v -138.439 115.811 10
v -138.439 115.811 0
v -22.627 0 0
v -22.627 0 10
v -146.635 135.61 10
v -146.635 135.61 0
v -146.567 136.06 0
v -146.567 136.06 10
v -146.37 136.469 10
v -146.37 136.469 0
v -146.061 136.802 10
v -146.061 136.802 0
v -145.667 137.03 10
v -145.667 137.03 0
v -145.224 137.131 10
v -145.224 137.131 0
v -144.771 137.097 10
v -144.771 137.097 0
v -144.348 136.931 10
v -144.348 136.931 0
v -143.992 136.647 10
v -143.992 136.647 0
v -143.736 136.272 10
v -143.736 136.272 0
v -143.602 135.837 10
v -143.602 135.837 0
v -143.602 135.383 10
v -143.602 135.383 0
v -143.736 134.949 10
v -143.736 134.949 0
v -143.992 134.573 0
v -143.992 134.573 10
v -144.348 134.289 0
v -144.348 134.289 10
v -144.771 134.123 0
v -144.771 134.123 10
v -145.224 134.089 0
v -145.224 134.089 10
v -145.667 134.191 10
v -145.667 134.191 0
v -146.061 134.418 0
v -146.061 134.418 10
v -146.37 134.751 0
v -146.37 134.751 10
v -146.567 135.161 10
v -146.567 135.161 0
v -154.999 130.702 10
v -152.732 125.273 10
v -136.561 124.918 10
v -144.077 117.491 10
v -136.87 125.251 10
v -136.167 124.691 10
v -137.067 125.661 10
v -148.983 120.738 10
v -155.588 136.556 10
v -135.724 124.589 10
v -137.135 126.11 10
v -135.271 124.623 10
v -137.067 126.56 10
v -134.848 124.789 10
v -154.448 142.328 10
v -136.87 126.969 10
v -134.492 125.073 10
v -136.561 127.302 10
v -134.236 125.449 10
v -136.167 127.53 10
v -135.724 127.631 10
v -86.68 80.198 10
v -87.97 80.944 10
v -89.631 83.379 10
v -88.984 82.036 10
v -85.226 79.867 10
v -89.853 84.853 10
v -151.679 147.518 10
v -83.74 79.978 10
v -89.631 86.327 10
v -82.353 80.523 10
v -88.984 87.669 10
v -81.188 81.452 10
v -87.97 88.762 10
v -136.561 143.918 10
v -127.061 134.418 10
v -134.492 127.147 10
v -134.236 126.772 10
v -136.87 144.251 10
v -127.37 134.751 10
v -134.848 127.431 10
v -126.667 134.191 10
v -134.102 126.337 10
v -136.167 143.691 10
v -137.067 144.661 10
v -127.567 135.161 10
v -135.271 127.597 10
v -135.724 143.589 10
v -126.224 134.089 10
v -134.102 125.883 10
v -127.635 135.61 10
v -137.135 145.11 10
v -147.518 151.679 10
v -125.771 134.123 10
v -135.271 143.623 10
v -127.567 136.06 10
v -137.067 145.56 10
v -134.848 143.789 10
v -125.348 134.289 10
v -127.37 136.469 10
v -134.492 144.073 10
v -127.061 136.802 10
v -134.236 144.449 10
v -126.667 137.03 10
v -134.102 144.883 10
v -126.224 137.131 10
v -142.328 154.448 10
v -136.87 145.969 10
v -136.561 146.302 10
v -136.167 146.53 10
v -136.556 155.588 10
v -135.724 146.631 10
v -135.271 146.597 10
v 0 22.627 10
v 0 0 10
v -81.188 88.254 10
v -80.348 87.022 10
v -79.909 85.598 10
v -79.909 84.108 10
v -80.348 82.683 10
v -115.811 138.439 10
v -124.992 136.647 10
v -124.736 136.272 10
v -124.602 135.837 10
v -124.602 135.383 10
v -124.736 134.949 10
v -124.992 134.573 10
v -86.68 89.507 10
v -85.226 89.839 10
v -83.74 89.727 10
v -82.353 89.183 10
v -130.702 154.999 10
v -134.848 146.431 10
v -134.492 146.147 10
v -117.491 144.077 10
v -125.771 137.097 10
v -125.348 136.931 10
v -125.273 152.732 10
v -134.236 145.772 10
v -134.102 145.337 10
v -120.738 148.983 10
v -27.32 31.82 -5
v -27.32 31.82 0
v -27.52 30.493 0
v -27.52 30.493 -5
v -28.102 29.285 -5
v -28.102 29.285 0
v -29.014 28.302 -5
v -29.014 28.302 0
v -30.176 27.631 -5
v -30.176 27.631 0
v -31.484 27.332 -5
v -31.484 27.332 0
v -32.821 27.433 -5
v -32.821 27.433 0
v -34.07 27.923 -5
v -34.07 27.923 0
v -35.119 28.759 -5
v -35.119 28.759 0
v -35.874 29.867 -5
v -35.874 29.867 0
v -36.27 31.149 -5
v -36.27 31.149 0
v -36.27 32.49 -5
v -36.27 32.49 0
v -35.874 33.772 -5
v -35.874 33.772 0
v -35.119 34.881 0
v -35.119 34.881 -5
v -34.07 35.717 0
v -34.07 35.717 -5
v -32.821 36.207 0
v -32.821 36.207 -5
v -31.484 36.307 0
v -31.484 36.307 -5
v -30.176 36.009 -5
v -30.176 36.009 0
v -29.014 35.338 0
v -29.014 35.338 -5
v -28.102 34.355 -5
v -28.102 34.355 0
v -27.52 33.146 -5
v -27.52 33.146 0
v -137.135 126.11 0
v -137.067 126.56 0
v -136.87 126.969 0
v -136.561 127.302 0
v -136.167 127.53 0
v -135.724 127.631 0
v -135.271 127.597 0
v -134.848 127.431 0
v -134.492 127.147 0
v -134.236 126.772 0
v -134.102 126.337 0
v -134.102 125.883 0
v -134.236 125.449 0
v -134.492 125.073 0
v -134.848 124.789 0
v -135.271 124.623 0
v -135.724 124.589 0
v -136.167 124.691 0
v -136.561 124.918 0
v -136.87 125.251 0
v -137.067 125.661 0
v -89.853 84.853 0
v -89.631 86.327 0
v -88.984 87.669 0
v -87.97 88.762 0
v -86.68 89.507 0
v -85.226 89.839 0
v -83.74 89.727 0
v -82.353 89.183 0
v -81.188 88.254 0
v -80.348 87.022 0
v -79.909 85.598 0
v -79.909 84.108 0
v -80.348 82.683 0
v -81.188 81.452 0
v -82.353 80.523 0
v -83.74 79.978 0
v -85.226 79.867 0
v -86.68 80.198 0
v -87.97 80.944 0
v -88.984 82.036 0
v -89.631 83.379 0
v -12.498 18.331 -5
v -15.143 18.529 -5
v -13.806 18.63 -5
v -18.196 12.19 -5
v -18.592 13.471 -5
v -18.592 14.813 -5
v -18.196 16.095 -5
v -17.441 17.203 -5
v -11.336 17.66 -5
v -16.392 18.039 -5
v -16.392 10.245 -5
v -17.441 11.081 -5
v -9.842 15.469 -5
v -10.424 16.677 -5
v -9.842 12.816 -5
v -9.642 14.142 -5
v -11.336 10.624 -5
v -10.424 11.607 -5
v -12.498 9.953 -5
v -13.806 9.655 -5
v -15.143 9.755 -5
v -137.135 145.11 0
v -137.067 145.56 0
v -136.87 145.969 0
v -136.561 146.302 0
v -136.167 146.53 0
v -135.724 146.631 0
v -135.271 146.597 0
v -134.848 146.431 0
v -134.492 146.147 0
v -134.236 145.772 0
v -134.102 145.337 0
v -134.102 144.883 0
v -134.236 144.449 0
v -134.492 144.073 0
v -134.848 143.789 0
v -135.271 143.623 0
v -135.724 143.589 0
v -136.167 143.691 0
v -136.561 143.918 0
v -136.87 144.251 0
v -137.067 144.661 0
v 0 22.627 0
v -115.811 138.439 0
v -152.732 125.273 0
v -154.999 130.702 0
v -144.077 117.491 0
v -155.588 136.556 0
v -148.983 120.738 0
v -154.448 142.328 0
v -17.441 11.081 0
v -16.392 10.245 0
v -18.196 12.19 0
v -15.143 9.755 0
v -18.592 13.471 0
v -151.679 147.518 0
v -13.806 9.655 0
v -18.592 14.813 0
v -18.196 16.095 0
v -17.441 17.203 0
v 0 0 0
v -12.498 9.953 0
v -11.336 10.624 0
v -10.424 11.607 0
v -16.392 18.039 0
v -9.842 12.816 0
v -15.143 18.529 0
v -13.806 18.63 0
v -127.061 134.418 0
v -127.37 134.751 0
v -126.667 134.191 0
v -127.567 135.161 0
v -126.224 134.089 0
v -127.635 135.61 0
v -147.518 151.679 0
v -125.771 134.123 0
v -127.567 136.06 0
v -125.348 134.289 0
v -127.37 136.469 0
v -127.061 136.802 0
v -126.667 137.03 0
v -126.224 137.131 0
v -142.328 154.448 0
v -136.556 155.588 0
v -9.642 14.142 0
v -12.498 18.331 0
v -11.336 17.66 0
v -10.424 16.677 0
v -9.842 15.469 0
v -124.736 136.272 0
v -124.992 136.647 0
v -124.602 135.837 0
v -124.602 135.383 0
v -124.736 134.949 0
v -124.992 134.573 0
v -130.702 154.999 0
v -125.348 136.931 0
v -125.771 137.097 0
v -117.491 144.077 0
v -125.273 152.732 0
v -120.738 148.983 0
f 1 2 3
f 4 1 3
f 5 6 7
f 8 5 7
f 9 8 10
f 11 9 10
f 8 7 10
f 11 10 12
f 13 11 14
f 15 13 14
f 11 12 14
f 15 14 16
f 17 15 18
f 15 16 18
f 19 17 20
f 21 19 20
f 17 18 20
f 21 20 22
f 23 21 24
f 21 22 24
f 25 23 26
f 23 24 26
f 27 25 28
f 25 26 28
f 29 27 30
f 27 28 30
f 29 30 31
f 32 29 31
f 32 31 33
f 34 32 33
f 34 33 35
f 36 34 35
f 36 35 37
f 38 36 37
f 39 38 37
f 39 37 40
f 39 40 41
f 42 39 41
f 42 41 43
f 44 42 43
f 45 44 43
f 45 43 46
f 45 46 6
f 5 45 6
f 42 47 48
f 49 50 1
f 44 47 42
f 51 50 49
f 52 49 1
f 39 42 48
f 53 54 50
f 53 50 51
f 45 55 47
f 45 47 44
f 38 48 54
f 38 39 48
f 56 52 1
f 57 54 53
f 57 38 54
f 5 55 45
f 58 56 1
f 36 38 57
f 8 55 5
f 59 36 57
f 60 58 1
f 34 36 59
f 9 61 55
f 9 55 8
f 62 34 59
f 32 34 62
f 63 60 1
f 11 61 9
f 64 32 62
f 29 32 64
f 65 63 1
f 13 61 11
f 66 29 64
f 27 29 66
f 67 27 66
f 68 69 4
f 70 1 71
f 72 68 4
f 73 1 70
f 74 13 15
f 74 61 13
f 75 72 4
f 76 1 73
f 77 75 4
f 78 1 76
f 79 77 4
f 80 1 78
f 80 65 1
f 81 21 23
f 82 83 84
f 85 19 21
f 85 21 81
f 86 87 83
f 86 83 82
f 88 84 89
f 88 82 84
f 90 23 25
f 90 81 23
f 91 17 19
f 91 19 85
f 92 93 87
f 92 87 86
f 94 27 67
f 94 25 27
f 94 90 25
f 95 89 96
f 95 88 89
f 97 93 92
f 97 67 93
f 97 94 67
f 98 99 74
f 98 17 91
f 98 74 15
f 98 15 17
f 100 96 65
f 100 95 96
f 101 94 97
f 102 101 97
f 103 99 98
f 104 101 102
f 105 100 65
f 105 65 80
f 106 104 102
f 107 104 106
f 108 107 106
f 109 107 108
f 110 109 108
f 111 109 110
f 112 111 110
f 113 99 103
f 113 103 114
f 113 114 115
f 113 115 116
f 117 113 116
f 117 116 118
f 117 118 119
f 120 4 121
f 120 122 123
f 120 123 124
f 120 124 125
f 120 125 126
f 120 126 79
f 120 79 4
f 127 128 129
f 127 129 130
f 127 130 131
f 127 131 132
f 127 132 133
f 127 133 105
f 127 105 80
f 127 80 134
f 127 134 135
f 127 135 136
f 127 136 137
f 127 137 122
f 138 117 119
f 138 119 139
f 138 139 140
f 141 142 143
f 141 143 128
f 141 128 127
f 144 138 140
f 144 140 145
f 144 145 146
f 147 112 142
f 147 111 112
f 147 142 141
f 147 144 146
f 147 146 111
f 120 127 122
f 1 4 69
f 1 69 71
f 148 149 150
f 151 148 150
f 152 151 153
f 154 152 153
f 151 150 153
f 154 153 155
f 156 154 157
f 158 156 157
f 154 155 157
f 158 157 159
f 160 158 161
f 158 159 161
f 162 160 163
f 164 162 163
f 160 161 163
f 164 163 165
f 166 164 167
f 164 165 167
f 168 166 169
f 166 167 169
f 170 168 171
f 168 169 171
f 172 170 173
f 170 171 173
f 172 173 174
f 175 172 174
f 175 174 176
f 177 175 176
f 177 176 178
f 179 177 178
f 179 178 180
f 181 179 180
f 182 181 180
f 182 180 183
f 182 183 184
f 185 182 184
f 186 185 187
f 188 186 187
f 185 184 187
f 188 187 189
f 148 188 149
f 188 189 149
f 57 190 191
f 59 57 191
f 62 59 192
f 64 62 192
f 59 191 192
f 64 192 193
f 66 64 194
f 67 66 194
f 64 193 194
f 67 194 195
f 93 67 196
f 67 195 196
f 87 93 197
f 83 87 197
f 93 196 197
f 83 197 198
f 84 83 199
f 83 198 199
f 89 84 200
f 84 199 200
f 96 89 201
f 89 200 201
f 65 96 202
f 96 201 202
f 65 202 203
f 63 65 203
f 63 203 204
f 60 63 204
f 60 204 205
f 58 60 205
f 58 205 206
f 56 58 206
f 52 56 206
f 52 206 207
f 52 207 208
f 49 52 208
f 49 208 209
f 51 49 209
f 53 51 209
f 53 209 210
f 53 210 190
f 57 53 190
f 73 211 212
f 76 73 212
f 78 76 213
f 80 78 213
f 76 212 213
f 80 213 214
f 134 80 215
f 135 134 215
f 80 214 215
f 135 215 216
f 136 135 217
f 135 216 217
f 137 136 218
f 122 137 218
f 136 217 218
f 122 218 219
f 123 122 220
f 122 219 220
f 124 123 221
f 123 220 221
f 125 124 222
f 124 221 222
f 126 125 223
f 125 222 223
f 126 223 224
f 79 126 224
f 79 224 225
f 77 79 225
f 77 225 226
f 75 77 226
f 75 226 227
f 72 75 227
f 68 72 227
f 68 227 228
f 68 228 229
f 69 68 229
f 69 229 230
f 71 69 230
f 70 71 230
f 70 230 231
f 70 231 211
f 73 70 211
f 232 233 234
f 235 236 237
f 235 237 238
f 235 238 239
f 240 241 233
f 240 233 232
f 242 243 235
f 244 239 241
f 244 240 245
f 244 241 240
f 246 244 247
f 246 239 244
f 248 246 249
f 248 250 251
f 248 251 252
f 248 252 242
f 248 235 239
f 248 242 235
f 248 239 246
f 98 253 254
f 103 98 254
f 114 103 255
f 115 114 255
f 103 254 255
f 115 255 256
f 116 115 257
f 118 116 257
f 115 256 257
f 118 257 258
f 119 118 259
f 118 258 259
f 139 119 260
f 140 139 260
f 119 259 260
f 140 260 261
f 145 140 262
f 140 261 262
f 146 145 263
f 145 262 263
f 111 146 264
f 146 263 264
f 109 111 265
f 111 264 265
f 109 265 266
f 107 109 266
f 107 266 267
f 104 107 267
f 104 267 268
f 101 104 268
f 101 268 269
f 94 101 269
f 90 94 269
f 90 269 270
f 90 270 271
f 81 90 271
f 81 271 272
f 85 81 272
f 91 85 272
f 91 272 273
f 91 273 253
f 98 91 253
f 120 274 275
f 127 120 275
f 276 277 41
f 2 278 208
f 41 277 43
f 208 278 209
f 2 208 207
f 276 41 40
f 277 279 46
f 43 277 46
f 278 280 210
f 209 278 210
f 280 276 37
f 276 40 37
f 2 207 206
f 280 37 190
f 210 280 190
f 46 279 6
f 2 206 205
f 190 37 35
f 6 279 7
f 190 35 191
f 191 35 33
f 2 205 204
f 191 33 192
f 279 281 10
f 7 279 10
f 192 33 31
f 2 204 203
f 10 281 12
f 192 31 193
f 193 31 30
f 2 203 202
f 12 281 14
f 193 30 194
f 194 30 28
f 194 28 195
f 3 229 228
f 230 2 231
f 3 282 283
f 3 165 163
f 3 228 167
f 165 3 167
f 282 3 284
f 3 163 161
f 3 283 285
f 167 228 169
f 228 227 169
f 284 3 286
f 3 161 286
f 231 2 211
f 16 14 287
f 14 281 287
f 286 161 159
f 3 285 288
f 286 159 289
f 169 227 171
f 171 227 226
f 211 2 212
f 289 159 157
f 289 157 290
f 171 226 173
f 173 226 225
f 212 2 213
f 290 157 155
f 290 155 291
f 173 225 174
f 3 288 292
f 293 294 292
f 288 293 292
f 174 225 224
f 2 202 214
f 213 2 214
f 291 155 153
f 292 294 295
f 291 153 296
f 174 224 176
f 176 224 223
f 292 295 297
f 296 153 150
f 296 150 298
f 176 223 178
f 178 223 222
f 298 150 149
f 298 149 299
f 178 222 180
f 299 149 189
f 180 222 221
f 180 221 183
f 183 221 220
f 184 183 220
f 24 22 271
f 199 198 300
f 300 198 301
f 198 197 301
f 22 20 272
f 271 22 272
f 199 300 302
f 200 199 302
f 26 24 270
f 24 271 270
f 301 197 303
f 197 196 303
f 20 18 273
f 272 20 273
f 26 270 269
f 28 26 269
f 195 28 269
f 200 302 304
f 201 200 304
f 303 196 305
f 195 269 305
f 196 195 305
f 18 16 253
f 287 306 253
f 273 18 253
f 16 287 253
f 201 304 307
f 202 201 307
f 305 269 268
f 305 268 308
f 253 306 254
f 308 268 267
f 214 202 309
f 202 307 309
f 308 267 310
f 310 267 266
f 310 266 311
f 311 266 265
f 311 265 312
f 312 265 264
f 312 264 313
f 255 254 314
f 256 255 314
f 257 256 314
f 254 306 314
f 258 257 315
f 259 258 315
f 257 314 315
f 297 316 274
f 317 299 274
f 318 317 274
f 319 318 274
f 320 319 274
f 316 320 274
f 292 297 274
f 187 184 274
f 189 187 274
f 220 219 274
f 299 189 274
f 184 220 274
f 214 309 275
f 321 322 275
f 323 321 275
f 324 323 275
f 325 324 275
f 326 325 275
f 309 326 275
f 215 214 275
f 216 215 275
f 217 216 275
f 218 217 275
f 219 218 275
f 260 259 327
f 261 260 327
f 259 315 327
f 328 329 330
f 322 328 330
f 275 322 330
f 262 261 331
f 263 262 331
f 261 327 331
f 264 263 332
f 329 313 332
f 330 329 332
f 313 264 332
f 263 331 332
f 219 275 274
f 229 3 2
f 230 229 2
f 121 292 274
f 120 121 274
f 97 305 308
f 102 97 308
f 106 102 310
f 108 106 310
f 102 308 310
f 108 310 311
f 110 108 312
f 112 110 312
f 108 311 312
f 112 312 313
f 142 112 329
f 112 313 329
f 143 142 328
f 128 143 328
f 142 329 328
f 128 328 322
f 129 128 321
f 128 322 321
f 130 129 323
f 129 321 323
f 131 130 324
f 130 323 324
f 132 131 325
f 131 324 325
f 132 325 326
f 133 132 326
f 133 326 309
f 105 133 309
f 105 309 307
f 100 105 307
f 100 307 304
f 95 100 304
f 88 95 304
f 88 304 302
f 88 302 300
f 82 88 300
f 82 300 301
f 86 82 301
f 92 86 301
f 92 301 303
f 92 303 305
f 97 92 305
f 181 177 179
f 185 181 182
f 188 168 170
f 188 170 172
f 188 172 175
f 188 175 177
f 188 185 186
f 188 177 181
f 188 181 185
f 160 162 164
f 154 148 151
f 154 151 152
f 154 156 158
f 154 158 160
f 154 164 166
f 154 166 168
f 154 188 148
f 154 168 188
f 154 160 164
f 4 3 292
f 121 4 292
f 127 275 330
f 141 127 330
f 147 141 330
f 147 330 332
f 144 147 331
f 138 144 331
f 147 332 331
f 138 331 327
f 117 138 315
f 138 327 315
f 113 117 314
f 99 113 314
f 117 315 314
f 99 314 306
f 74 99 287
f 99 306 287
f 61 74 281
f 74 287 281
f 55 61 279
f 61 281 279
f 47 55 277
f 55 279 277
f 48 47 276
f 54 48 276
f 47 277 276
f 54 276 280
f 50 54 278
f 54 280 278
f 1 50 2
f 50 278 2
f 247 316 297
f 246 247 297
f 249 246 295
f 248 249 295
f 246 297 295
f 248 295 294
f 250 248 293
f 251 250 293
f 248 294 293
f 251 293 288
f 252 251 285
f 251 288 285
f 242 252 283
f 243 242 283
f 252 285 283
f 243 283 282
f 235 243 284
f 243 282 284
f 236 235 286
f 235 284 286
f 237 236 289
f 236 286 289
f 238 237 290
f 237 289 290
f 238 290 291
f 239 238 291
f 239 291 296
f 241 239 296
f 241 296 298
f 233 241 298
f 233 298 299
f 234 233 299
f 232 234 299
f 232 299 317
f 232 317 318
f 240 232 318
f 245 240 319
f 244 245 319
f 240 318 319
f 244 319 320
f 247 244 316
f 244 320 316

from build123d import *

# Parameters (mm, degrees)
BOSS_EXTRU_1_DEPTH      = 10
ESQUISSE2_R             = 4.5
BOSS_EXTRU_2_DEPTH      = 5
ESQUISSE3_R             = 1.525
ESQUISSE3_R_2           = 5
ENL_V_MAT_EXTRU_1_DEPTH = 221.29310456


with BuildPart() as part:
    # Esquisse1 → Boss.-Extru.1 (new body)
    with BuildSketch(Plane.XY):
        with BuildLine():
            Line((-55, 32.372583002), (-22.627416998, 0))
            Line((-22.627416998, 0), (0, 0))
            Line((0, 0), (0, 22.627416998))
            Line((0, 22.627416998), (-32.372583002, 55))
            Line((-32.372583002, 55), (-115.811183182, 138.43860018))
            ThreePointArc((-115.811183182, 138.43860018), (-115.660488879, 137.027953457), (-115.610173055, 135.610173055))
            ThreePointArc((-115.610173055, 135.610173055), (-122.506138228, 120.501093955), (-138.43860018, 115.811183182))
            Line((-138.43860018, 115.811183182), (-55, 32.372583002))
        make_face()
        with BuildLine():
            ThreePointArc((-115.811183182, 138.43860018), (-149.752308679, 149.752308679), (-138.43860018, 115.811183182))
            Line((-138.43860018, 115.811183182), (-146.923881554, 124.296464556))
            Line((-146.923881554, 124.296464556), (-124.296464556, 146.923881554))
            Line((-124.296464556, 146.923881554), (-115.811183182, 138.43860018))
        make_face()
        with BuildLine():
            Line((-146.923881554, 124.296464556), (-138.43860018, 115.811183182))
            ThreePointArc((-138.43860018, 115.811183182), (-122.506138228, 120.501093955), (-115.610173055, 135.610173055))
            ThreePointArc((-115.610173055, 135.610173055), (-115.660488879, 137.027953457), (-115.811183182, 138.43860018))
            Line((-115.811183182, 138.43860018), (-124.296464556, 146.923881554))
            Line((-124.296464556, 146.923881554), (-146.923881554, 124.296464556))
        make_face()
    extrude(amount=BOSS_EXTRU_1_DEPTH)

    # Esquisse2 → Boss.-Extru.2 (add)
    with BuildSketch(Plane(origin=(0, 0, 0), x_dir=(-1, 0, 0), z_dir=(0, 0, -1))):
        with Locations(Location((31.819805153, 31.819805153, 0), (0, 0, 180))):
            Circle(ESQUISSE2_R)
        with Locations(Location((14.142135624, 14.142135624, 0), (0, 0, 180))):
            Circle(ESQUISSE2_R)
    extrude(amount=BOSS_EXTRU_2_DEPTH)

    # Esquisse3 → Enlèv. mat.-Extru.1 (cut, through all)
    with BuildSketch(Plane(origin=(0, 0, 0), x_dir=(-1, 0, 0), z_dir=(0, 0, -1))):
        with Locations((135.610173055, 145.110173055)):
            Circle(ESQUISSE3_R)
        with Locations((145.110173055, 135.610173055)):
            Circle(ESQUISSE3_R)
        with Locations((135.610173055, 126.110173055)):
            Circle(ESQUISSE3_R)
        with Locations((126.110173055, 135.610173055)):
            Circle(ESQUISSE3_R)
        with Locations((84.852813742, 84.852813742)):
            Circle(ESQUISSE3_R_2)
    extrude(amount=-ENL_V_MAT_EXTRU_1_DEPTH, mode=Mode.SUBTRACT)


solid = part.part
